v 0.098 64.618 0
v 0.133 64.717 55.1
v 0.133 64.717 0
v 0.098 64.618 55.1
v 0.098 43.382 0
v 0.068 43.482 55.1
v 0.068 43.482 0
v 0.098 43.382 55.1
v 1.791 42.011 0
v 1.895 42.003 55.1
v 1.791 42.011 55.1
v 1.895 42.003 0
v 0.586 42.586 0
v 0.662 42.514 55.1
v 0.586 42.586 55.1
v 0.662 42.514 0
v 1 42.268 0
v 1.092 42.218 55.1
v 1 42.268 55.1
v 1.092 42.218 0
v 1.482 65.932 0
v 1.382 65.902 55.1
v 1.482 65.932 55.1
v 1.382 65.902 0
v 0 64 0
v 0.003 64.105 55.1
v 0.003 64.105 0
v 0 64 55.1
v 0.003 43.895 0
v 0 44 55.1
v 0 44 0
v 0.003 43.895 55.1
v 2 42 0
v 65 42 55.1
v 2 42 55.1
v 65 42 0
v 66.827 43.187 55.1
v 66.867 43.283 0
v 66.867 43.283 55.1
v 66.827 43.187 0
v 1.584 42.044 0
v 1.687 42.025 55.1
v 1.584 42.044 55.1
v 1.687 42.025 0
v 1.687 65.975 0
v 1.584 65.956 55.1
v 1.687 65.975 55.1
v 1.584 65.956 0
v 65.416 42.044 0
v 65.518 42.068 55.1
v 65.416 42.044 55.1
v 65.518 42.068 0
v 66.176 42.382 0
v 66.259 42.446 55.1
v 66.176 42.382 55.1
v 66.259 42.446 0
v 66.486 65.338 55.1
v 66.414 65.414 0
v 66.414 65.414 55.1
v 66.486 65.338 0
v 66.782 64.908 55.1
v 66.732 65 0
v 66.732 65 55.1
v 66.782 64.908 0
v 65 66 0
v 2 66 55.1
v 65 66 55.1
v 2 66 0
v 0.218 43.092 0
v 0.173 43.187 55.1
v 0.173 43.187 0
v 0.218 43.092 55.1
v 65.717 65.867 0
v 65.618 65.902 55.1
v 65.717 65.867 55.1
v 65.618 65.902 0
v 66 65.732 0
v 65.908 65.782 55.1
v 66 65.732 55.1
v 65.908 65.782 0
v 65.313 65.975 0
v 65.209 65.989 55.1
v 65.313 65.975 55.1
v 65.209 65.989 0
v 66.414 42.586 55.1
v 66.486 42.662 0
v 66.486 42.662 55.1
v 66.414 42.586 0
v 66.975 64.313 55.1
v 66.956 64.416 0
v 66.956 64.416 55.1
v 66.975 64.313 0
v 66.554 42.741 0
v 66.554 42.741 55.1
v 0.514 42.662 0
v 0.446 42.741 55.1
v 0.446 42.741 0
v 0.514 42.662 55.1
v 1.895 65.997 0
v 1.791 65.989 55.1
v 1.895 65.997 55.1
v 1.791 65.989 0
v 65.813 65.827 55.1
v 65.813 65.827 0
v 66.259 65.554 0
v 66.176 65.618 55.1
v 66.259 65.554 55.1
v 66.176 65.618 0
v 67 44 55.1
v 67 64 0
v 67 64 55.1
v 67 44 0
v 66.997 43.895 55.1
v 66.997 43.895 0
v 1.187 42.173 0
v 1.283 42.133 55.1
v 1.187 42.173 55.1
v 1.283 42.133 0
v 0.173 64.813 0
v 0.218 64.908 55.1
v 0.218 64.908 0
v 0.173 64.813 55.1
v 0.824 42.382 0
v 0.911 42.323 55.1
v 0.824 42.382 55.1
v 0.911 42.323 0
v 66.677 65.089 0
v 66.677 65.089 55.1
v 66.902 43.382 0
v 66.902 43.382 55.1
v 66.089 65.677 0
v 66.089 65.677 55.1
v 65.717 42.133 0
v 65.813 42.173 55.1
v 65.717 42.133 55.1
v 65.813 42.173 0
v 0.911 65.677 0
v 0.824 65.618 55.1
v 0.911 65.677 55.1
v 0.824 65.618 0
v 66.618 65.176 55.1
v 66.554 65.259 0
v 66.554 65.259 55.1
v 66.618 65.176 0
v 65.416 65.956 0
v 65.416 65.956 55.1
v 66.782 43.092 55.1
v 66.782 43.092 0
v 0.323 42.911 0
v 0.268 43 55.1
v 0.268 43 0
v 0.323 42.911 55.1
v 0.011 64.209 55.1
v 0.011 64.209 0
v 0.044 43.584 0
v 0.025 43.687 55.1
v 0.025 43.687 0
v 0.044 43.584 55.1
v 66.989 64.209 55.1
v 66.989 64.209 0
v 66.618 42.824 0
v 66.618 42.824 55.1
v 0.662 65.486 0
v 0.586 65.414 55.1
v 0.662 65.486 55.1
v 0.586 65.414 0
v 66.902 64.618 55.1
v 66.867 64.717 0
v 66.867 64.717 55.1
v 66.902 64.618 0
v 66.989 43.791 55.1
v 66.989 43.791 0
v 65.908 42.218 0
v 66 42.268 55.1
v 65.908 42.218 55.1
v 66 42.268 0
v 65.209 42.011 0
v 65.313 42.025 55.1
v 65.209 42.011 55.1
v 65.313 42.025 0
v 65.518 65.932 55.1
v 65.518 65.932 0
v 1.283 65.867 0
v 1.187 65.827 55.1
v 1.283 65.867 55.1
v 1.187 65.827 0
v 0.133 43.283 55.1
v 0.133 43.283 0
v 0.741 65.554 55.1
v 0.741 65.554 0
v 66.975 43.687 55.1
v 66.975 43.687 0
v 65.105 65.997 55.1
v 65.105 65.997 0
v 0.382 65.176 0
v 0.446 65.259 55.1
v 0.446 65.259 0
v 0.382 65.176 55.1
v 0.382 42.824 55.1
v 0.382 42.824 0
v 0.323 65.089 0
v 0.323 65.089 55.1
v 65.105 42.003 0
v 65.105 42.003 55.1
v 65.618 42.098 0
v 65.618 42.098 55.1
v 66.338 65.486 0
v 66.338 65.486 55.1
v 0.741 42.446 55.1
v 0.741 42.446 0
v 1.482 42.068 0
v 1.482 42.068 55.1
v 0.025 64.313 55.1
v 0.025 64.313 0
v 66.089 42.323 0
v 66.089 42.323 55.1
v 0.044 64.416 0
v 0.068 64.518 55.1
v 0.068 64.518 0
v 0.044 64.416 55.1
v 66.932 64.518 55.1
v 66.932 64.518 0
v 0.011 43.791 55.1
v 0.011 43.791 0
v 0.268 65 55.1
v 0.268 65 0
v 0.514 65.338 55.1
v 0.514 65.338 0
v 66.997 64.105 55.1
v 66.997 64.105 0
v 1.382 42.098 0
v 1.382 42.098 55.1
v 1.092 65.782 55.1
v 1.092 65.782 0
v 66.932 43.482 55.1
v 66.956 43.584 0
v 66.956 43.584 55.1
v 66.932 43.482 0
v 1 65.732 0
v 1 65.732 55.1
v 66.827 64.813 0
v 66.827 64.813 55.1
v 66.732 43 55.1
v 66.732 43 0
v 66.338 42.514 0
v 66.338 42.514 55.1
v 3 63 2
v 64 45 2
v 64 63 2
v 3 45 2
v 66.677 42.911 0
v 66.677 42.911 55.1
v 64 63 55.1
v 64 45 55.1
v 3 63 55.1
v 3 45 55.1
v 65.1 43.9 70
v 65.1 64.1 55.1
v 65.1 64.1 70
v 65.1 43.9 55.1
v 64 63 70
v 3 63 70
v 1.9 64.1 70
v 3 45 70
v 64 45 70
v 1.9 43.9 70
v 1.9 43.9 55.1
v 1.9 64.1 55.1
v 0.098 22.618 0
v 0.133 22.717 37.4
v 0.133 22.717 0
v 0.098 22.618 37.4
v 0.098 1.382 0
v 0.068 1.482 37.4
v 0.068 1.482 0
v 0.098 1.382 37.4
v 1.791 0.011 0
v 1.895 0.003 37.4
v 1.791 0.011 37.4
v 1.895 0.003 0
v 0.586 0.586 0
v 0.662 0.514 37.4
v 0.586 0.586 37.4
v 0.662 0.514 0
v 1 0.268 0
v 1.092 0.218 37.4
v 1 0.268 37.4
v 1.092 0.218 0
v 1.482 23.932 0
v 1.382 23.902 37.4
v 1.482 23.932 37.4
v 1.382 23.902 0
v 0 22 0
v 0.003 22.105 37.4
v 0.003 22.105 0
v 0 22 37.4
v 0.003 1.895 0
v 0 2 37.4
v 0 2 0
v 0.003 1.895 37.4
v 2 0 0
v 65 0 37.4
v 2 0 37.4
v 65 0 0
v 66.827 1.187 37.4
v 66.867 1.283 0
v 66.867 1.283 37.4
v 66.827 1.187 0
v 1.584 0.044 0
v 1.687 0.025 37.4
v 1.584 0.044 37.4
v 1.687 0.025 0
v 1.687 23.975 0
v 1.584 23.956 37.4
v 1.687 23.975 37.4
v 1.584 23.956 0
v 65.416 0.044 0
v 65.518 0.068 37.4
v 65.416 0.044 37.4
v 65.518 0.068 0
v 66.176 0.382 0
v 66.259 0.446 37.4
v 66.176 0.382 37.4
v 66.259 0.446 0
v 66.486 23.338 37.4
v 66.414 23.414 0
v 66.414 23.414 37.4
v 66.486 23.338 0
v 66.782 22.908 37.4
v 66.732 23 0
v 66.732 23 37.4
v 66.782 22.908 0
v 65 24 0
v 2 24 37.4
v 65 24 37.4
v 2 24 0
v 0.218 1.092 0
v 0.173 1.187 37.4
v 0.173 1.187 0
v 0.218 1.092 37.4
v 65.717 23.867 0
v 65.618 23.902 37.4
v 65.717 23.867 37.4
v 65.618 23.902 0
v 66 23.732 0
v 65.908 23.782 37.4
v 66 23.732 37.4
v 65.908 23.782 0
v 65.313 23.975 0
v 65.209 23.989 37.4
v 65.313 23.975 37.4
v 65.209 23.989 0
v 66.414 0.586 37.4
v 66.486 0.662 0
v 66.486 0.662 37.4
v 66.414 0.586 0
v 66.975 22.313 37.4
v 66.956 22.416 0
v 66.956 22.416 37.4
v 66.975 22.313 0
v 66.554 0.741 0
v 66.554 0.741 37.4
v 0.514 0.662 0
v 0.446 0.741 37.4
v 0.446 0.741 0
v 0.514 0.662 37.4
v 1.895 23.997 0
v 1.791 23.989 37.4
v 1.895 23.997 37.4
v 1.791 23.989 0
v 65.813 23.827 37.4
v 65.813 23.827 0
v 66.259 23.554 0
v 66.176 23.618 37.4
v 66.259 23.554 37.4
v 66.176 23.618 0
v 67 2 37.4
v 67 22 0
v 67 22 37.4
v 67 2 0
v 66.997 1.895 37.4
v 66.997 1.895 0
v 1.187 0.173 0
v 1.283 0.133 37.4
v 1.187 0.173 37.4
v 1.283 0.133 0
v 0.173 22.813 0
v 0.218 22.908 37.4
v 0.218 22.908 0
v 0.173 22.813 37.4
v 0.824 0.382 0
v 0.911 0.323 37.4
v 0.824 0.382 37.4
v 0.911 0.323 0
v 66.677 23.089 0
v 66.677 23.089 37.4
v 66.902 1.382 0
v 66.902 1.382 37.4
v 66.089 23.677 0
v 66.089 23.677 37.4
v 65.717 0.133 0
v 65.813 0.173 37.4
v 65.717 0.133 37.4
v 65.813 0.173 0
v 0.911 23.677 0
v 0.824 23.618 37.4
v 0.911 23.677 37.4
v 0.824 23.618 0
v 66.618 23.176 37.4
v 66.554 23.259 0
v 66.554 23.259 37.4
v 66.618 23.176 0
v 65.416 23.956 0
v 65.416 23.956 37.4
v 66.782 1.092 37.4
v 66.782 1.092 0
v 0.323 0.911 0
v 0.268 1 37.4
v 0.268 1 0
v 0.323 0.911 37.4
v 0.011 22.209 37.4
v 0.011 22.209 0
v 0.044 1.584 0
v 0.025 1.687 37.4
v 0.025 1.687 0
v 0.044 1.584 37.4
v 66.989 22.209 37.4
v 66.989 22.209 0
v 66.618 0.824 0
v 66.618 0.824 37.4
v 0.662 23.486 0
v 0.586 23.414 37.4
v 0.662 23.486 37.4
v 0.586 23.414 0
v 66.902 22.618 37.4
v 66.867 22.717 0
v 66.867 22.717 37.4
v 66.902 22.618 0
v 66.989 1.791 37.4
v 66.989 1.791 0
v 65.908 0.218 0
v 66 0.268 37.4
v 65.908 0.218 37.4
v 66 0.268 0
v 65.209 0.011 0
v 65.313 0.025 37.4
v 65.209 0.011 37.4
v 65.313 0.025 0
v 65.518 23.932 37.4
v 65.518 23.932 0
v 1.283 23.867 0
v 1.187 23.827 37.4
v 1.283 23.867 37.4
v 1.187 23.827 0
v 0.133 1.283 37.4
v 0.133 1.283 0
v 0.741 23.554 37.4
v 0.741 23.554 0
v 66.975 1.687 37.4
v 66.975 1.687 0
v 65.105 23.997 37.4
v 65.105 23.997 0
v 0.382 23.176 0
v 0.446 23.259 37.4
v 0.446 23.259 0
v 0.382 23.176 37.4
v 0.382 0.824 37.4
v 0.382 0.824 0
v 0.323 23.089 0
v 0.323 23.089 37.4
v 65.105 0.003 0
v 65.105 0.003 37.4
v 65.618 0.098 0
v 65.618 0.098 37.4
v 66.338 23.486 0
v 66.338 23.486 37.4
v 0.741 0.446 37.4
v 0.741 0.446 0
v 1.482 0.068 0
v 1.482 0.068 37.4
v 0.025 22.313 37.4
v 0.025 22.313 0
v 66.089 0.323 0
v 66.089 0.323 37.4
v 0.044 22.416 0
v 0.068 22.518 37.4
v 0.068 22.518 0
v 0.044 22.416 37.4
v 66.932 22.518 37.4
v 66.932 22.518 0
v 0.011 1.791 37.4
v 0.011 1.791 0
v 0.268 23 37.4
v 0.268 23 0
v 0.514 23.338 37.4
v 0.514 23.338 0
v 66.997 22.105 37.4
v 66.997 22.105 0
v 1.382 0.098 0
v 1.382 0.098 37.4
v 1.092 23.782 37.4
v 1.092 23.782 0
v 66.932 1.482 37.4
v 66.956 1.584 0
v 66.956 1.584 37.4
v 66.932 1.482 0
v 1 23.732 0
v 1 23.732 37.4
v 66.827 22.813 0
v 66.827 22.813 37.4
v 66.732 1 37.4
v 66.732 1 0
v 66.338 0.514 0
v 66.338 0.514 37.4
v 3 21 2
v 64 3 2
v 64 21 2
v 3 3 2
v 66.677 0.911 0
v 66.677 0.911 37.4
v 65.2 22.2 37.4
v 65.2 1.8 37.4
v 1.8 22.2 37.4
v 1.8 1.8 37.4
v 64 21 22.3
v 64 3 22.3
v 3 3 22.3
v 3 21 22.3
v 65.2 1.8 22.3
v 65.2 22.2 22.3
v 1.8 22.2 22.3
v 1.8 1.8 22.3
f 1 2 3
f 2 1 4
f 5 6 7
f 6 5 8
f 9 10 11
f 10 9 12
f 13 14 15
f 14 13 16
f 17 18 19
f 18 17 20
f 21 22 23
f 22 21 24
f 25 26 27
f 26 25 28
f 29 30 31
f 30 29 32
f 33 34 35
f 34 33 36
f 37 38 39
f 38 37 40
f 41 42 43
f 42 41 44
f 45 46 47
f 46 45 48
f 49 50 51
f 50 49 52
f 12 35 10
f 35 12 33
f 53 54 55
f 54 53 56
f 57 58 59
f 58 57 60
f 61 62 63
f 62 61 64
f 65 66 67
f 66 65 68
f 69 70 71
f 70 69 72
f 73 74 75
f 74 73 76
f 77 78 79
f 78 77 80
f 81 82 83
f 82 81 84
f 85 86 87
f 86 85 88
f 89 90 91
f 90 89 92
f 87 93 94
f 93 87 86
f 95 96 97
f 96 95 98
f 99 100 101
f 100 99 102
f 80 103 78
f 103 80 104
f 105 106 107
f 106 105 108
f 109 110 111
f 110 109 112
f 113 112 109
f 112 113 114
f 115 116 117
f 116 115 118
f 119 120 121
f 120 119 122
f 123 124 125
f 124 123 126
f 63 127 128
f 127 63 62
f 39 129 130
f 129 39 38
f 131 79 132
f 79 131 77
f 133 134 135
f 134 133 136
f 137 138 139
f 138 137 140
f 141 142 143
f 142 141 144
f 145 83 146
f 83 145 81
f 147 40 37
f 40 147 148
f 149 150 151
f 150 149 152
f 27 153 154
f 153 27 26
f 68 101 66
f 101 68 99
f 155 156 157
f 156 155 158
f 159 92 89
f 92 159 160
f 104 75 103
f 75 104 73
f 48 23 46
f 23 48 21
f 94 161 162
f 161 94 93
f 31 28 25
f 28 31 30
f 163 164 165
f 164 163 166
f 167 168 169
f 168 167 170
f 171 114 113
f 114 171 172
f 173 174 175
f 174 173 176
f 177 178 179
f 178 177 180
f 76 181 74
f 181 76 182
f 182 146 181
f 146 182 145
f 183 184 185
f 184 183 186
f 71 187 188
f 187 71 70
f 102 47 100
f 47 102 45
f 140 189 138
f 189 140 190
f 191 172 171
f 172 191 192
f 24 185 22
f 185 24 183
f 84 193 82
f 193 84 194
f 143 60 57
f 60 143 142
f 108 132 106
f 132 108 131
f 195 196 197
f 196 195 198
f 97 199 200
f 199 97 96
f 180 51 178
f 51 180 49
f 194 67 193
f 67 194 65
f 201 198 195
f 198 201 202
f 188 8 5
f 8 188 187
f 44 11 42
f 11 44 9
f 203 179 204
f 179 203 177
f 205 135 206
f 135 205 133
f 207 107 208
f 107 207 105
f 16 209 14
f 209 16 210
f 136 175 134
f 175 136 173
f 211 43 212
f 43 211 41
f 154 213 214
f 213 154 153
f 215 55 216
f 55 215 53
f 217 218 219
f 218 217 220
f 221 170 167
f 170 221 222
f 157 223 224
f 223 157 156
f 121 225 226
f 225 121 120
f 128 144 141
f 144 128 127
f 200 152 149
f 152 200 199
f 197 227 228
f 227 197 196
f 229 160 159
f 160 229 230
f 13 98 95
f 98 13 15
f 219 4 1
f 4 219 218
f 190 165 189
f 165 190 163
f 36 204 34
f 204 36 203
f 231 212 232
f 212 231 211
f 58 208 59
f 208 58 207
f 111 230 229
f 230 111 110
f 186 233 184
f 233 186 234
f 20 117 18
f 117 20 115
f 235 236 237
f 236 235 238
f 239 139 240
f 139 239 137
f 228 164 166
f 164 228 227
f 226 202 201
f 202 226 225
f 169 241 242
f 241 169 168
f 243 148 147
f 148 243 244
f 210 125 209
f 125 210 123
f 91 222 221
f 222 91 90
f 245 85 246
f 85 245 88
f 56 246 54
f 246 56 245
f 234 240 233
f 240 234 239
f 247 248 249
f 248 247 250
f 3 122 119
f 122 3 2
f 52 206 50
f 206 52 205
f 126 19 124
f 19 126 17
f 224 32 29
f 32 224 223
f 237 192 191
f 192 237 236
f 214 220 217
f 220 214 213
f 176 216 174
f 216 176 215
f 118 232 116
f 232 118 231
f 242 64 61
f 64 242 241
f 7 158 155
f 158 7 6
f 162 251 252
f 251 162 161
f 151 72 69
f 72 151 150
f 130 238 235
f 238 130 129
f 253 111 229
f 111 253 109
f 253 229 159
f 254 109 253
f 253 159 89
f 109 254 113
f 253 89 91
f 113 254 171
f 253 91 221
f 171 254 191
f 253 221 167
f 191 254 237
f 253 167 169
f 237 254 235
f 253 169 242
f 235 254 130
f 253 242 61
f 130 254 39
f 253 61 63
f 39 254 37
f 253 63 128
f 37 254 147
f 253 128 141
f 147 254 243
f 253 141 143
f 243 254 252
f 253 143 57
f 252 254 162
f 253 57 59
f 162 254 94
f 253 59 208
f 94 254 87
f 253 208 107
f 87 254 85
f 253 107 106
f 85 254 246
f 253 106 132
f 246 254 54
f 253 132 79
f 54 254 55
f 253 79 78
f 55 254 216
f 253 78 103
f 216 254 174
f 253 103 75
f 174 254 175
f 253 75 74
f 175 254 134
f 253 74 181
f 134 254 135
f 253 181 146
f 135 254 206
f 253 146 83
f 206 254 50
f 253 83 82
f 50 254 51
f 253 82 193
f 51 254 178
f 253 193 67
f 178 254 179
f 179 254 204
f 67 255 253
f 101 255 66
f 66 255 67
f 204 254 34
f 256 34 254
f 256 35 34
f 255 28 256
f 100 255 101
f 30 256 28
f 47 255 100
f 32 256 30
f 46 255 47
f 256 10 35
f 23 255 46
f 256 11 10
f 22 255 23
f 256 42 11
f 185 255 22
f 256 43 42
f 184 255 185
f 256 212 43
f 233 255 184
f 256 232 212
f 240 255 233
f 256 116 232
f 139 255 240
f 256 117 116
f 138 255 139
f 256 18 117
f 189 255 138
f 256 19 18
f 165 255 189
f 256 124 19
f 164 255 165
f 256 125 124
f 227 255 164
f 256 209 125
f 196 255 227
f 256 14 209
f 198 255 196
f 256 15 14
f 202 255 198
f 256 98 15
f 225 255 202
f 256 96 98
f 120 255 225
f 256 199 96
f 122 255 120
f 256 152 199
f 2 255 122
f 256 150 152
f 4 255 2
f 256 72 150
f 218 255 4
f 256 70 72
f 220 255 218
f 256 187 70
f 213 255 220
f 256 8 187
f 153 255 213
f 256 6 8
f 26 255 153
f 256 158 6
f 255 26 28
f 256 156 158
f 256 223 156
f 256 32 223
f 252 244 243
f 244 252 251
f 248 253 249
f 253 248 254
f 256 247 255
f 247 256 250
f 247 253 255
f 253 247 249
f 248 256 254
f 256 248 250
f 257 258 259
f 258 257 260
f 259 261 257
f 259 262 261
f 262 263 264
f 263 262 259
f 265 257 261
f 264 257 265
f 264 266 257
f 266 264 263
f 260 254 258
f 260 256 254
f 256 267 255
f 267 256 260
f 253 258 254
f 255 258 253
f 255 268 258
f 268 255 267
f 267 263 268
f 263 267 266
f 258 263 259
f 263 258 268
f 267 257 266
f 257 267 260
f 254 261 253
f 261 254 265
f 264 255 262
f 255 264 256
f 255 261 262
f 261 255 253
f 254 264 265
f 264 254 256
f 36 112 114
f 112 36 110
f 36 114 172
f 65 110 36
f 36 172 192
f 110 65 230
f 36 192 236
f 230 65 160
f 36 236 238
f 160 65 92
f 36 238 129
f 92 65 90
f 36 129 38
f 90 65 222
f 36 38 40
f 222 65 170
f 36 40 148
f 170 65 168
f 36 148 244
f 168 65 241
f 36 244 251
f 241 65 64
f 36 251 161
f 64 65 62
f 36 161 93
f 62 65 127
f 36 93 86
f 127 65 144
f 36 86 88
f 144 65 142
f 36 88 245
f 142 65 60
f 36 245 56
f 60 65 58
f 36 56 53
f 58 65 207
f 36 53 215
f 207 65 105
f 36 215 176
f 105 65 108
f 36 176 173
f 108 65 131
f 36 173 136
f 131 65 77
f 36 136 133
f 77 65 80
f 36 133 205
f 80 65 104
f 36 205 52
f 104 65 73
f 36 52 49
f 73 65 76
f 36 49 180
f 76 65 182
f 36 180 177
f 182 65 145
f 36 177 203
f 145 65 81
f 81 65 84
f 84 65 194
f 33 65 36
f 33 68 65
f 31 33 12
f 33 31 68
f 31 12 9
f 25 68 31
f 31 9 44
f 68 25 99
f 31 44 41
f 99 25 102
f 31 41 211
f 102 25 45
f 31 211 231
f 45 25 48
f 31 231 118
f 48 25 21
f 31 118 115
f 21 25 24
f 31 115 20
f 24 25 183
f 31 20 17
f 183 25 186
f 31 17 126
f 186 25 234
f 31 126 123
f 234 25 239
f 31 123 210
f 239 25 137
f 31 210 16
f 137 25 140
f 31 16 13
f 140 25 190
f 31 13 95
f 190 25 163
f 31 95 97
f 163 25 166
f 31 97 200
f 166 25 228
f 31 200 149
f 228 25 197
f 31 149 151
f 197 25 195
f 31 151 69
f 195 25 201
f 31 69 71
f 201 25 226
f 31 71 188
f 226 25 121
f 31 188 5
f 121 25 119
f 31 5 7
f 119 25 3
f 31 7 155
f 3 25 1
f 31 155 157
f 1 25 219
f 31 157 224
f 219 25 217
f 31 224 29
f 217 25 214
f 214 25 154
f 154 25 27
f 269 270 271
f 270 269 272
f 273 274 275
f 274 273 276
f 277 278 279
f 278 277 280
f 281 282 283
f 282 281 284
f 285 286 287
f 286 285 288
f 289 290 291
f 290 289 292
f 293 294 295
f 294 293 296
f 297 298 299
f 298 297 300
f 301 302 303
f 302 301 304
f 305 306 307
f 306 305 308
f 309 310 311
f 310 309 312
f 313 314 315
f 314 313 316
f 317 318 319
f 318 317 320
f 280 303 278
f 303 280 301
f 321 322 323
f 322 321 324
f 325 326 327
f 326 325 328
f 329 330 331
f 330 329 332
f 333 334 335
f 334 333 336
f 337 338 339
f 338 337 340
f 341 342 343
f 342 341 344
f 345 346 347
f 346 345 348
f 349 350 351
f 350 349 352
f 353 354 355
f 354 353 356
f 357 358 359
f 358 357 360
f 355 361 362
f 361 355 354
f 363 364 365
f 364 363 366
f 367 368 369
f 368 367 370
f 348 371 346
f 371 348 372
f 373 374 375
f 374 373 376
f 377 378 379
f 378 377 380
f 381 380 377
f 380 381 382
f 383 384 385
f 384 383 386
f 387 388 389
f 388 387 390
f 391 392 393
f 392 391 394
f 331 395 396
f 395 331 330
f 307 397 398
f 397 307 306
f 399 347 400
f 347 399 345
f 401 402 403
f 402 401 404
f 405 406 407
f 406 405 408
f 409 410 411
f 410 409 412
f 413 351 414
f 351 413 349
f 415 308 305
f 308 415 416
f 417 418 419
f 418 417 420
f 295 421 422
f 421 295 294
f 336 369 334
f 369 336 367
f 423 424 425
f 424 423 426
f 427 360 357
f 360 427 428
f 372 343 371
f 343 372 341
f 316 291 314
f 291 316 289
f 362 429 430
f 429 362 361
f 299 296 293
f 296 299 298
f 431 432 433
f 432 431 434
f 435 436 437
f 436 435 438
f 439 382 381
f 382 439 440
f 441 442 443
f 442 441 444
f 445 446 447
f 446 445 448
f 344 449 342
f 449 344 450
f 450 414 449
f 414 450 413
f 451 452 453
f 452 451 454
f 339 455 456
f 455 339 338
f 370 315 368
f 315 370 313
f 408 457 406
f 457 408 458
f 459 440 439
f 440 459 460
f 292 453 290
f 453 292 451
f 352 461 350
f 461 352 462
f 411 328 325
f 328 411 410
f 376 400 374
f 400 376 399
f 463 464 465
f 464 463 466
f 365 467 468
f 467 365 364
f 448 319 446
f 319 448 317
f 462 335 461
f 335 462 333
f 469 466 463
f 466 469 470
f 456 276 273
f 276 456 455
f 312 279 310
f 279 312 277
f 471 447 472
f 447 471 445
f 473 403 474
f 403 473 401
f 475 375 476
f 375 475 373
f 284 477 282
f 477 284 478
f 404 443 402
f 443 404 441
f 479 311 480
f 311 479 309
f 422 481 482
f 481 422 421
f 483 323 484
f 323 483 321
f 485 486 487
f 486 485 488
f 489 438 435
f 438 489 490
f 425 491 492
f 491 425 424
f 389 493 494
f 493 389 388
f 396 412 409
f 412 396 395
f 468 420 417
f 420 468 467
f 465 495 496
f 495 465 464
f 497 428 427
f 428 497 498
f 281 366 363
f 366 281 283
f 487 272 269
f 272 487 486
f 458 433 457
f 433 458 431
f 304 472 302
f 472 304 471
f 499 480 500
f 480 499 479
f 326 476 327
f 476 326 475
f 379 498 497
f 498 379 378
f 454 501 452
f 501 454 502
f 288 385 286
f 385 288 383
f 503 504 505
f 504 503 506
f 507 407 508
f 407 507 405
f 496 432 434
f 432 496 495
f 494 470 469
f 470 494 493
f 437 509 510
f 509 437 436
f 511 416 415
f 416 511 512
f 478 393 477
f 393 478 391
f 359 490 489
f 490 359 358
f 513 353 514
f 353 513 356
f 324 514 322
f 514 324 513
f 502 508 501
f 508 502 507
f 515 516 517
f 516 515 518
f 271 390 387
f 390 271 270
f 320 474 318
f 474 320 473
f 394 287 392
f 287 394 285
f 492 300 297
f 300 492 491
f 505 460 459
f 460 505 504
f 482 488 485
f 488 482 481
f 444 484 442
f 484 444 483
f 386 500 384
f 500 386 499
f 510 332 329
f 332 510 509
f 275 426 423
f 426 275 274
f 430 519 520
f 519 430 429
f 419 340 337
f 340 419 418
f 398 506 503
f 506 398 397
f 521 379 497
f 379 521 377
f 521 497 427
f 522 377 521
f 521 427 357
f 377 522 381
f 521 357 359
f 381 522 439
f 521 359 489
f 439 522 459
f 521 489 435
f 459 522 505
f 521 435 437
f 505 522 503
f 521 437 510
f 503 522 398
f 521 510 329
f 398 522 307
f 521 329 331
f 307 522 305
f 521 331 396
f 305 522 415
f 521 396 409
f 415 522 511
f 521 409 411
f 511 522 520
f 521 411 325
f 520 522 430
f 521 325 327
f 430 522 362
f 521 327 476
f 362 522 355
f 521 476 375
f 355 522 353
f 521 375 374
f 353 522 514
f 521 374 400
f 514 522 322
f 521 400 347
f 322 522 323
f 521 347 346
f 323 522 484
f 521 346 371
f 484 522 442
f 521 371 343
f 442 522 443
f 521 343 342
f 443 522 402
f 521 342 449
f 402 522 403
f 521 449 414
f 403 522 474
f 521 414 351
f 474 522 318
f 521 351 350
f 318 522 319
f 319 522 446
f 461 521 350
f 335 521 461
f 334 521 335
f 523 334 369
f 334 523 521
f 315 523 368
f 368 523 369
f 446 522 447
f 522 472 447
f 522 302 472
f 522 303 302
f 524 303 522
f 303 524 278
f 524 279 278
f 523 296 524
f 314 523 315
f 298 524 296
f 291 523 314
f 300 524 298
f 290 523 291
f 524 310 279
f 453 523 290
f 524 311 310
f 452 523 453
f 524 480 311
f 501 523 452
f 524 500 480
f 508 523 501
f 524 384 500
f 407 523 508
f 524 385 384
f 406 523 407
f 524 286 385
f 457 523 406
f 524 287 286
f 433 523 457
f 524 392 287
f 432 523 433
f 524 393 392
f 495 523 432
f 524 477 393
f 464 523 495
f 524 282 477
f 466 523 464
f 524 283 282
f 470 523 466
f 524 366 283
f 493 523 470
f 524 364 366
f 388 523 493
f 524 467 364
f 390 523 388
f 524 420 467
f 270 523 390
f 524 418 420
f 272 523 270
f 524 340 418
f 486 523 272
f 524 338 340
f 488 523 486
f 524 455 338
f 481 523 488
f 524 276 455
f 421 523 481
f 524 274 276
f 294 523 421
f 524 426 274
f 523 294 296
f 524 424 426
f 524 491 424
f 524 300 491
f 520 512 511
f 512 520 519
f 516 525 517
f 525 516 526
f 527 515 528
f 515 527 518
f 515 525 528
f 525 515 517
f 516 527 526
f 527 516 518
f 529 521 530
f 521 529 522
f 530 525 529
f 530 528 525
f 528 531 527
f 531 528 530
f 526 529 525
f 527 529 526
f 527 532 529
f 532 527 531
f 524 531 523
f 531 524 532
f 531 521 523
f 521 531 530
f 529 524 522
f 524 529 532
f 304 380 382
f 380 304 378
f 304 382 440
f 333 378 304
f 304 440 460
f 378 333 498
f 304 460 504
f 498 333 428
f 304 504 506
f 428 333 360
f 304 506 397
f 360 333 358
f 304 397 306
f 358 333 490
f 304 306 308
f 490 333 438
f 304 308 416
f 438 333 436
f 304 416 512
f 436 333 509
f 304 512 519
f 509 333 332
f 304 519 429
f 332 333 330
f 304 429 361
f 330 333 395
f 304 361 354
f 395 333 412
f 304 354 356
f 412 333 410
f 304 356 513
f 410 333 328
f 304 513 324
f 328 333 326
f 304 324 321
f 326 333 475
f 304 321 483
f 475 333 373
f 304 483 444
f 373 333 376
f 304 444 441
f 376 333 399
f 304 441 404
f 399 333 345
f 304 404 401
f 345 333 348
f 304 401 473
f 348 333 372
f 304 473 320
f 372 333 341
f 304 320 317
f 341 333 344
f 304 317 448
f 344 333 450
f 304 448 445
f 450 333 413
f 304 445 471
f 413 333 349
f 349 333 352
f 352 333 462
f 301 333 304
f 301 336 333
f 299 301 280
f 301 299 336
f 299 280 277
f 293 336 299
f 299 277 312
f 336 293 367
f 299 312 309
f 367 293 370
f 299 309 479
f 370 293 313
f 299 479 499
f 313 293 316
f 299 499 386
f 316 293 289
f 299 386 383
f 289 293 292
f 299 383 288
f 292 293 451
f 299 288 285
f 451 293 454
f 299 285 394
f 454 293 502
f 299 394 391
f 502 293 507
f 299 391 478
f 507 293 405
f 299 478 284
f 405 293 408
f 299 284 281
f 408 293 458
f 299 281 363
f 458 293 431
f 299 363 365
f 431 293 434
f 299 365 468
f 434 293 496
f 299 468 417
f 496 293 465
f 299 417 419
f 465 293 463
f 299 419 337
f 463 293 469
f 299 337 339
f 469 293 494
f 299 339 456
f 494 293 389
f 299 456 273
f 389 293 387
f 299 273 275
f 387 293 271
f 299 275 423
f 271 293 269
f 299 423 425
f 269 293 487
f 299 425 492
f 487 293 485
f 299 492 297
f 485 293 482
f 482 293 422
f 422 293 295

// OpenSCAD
// Main product thanks to https://www.thingiverse.com/thing:1394486
//   Added comments and made some tweaks.

$fn=120;

// Deck dimensions
cx=61.0;
cy=18;
cz=88.5;

// Case thickness
dx=3;
dy=3;
dz=2;

// Top/bottom ratio (should equal 100%)
zp1=0.60;
zp2=0.40;

// Dimensions of the lip that connects the parts together
dxlip=1.2;
dylip=1.2;
dzlip=15.0;

// Tolerance spacing between parts that connect together
tol=0.1;

// Rounded edge radius
radius = 2;

module card_box_end()
{
    rounded_rect([cx + dx * 2, cy + dy * 2, dz]);
}

module card_box_middle_bottom()
{
    difference()
    {
        rounded_rect([cx + dx * 2, cy + dy * 2, cz * zp1]);
        
        translate([dx, dy, 0])
        cube([cx, cy, cz]);
    }
}

module card_box_middle_top()
{
    difference()
    {
        rounded_rect([cx + dx * 2, cy + dy * 2, cz * zp2]);
        
        translate([dx, dy, 0])
        cube([cx, cy, cz]);
        
        translate([0, 0, cz * zp2 - dzlip - tol])
        card_box_top_lip();
    }
}
module card_box_bottom_lip()
{
    translate([dx - dxlip, dy - dylip, 0])
    difference()
    {
        translate([tol, tol, 0])
        cube([cx + dxlip * 2 - tol * 2, cy + dylip * 2 - tol * 2, dzlip - tol]);
        
        translate([dxlip, dylip, 0])
        cube([cx, cy, dzlip]);
    }
}

module card_box_top_lip()
{
    translate([dx - dxlip, dy - dylip, 0])
    cube([cx + dxlip * 2, cy + dylip * 2, dzlip + tol]);
}

module card_box_bottom()
{
    card_box_end();

    translate([0, 0, dz])
    card_box_middle_bottom();
    
    translate([0, 0, dz + cz * zp1])
    card_box_bottom_lip();   
}

module card_box_top()
{
    card_box_end();

    translate([0, 0, dz])
    card_box_middle_top();
}

module rounded_rect(size, radius=radius)
{
	x = size[0];
	y = size[1];
	z = size[2];
	
	hull()
	{
		translate([radius, radius, 0])
		cylinder(r=radius,h=z);
		
		translate([x-radius, radius, 0])
		cylinder(r=radius,h=z);
		
		translate([x-radius, y-radius, 0])
		cylinder(r=radius,h=z);
		
		translate([radius, y-radius, 0])
		cylinder(r=radius,h=z);
	}
}

module card_box_print()
{
    translate([0, (cy + dy) * 2, 0])
    card_box_bottom();

    card_box_top();
}

module card_box_exploded()
{
    card_box_bottom();

    translate([0, 0, dzlip * 10])
    translate([0, cy + dy * 2, cz + dz])
    rotate([180,0,0])
    card_box_top();
}

//card_box_end();

//card_box_bottom();
//card_box_top();

//card_box_exploded();

card_box_print();
